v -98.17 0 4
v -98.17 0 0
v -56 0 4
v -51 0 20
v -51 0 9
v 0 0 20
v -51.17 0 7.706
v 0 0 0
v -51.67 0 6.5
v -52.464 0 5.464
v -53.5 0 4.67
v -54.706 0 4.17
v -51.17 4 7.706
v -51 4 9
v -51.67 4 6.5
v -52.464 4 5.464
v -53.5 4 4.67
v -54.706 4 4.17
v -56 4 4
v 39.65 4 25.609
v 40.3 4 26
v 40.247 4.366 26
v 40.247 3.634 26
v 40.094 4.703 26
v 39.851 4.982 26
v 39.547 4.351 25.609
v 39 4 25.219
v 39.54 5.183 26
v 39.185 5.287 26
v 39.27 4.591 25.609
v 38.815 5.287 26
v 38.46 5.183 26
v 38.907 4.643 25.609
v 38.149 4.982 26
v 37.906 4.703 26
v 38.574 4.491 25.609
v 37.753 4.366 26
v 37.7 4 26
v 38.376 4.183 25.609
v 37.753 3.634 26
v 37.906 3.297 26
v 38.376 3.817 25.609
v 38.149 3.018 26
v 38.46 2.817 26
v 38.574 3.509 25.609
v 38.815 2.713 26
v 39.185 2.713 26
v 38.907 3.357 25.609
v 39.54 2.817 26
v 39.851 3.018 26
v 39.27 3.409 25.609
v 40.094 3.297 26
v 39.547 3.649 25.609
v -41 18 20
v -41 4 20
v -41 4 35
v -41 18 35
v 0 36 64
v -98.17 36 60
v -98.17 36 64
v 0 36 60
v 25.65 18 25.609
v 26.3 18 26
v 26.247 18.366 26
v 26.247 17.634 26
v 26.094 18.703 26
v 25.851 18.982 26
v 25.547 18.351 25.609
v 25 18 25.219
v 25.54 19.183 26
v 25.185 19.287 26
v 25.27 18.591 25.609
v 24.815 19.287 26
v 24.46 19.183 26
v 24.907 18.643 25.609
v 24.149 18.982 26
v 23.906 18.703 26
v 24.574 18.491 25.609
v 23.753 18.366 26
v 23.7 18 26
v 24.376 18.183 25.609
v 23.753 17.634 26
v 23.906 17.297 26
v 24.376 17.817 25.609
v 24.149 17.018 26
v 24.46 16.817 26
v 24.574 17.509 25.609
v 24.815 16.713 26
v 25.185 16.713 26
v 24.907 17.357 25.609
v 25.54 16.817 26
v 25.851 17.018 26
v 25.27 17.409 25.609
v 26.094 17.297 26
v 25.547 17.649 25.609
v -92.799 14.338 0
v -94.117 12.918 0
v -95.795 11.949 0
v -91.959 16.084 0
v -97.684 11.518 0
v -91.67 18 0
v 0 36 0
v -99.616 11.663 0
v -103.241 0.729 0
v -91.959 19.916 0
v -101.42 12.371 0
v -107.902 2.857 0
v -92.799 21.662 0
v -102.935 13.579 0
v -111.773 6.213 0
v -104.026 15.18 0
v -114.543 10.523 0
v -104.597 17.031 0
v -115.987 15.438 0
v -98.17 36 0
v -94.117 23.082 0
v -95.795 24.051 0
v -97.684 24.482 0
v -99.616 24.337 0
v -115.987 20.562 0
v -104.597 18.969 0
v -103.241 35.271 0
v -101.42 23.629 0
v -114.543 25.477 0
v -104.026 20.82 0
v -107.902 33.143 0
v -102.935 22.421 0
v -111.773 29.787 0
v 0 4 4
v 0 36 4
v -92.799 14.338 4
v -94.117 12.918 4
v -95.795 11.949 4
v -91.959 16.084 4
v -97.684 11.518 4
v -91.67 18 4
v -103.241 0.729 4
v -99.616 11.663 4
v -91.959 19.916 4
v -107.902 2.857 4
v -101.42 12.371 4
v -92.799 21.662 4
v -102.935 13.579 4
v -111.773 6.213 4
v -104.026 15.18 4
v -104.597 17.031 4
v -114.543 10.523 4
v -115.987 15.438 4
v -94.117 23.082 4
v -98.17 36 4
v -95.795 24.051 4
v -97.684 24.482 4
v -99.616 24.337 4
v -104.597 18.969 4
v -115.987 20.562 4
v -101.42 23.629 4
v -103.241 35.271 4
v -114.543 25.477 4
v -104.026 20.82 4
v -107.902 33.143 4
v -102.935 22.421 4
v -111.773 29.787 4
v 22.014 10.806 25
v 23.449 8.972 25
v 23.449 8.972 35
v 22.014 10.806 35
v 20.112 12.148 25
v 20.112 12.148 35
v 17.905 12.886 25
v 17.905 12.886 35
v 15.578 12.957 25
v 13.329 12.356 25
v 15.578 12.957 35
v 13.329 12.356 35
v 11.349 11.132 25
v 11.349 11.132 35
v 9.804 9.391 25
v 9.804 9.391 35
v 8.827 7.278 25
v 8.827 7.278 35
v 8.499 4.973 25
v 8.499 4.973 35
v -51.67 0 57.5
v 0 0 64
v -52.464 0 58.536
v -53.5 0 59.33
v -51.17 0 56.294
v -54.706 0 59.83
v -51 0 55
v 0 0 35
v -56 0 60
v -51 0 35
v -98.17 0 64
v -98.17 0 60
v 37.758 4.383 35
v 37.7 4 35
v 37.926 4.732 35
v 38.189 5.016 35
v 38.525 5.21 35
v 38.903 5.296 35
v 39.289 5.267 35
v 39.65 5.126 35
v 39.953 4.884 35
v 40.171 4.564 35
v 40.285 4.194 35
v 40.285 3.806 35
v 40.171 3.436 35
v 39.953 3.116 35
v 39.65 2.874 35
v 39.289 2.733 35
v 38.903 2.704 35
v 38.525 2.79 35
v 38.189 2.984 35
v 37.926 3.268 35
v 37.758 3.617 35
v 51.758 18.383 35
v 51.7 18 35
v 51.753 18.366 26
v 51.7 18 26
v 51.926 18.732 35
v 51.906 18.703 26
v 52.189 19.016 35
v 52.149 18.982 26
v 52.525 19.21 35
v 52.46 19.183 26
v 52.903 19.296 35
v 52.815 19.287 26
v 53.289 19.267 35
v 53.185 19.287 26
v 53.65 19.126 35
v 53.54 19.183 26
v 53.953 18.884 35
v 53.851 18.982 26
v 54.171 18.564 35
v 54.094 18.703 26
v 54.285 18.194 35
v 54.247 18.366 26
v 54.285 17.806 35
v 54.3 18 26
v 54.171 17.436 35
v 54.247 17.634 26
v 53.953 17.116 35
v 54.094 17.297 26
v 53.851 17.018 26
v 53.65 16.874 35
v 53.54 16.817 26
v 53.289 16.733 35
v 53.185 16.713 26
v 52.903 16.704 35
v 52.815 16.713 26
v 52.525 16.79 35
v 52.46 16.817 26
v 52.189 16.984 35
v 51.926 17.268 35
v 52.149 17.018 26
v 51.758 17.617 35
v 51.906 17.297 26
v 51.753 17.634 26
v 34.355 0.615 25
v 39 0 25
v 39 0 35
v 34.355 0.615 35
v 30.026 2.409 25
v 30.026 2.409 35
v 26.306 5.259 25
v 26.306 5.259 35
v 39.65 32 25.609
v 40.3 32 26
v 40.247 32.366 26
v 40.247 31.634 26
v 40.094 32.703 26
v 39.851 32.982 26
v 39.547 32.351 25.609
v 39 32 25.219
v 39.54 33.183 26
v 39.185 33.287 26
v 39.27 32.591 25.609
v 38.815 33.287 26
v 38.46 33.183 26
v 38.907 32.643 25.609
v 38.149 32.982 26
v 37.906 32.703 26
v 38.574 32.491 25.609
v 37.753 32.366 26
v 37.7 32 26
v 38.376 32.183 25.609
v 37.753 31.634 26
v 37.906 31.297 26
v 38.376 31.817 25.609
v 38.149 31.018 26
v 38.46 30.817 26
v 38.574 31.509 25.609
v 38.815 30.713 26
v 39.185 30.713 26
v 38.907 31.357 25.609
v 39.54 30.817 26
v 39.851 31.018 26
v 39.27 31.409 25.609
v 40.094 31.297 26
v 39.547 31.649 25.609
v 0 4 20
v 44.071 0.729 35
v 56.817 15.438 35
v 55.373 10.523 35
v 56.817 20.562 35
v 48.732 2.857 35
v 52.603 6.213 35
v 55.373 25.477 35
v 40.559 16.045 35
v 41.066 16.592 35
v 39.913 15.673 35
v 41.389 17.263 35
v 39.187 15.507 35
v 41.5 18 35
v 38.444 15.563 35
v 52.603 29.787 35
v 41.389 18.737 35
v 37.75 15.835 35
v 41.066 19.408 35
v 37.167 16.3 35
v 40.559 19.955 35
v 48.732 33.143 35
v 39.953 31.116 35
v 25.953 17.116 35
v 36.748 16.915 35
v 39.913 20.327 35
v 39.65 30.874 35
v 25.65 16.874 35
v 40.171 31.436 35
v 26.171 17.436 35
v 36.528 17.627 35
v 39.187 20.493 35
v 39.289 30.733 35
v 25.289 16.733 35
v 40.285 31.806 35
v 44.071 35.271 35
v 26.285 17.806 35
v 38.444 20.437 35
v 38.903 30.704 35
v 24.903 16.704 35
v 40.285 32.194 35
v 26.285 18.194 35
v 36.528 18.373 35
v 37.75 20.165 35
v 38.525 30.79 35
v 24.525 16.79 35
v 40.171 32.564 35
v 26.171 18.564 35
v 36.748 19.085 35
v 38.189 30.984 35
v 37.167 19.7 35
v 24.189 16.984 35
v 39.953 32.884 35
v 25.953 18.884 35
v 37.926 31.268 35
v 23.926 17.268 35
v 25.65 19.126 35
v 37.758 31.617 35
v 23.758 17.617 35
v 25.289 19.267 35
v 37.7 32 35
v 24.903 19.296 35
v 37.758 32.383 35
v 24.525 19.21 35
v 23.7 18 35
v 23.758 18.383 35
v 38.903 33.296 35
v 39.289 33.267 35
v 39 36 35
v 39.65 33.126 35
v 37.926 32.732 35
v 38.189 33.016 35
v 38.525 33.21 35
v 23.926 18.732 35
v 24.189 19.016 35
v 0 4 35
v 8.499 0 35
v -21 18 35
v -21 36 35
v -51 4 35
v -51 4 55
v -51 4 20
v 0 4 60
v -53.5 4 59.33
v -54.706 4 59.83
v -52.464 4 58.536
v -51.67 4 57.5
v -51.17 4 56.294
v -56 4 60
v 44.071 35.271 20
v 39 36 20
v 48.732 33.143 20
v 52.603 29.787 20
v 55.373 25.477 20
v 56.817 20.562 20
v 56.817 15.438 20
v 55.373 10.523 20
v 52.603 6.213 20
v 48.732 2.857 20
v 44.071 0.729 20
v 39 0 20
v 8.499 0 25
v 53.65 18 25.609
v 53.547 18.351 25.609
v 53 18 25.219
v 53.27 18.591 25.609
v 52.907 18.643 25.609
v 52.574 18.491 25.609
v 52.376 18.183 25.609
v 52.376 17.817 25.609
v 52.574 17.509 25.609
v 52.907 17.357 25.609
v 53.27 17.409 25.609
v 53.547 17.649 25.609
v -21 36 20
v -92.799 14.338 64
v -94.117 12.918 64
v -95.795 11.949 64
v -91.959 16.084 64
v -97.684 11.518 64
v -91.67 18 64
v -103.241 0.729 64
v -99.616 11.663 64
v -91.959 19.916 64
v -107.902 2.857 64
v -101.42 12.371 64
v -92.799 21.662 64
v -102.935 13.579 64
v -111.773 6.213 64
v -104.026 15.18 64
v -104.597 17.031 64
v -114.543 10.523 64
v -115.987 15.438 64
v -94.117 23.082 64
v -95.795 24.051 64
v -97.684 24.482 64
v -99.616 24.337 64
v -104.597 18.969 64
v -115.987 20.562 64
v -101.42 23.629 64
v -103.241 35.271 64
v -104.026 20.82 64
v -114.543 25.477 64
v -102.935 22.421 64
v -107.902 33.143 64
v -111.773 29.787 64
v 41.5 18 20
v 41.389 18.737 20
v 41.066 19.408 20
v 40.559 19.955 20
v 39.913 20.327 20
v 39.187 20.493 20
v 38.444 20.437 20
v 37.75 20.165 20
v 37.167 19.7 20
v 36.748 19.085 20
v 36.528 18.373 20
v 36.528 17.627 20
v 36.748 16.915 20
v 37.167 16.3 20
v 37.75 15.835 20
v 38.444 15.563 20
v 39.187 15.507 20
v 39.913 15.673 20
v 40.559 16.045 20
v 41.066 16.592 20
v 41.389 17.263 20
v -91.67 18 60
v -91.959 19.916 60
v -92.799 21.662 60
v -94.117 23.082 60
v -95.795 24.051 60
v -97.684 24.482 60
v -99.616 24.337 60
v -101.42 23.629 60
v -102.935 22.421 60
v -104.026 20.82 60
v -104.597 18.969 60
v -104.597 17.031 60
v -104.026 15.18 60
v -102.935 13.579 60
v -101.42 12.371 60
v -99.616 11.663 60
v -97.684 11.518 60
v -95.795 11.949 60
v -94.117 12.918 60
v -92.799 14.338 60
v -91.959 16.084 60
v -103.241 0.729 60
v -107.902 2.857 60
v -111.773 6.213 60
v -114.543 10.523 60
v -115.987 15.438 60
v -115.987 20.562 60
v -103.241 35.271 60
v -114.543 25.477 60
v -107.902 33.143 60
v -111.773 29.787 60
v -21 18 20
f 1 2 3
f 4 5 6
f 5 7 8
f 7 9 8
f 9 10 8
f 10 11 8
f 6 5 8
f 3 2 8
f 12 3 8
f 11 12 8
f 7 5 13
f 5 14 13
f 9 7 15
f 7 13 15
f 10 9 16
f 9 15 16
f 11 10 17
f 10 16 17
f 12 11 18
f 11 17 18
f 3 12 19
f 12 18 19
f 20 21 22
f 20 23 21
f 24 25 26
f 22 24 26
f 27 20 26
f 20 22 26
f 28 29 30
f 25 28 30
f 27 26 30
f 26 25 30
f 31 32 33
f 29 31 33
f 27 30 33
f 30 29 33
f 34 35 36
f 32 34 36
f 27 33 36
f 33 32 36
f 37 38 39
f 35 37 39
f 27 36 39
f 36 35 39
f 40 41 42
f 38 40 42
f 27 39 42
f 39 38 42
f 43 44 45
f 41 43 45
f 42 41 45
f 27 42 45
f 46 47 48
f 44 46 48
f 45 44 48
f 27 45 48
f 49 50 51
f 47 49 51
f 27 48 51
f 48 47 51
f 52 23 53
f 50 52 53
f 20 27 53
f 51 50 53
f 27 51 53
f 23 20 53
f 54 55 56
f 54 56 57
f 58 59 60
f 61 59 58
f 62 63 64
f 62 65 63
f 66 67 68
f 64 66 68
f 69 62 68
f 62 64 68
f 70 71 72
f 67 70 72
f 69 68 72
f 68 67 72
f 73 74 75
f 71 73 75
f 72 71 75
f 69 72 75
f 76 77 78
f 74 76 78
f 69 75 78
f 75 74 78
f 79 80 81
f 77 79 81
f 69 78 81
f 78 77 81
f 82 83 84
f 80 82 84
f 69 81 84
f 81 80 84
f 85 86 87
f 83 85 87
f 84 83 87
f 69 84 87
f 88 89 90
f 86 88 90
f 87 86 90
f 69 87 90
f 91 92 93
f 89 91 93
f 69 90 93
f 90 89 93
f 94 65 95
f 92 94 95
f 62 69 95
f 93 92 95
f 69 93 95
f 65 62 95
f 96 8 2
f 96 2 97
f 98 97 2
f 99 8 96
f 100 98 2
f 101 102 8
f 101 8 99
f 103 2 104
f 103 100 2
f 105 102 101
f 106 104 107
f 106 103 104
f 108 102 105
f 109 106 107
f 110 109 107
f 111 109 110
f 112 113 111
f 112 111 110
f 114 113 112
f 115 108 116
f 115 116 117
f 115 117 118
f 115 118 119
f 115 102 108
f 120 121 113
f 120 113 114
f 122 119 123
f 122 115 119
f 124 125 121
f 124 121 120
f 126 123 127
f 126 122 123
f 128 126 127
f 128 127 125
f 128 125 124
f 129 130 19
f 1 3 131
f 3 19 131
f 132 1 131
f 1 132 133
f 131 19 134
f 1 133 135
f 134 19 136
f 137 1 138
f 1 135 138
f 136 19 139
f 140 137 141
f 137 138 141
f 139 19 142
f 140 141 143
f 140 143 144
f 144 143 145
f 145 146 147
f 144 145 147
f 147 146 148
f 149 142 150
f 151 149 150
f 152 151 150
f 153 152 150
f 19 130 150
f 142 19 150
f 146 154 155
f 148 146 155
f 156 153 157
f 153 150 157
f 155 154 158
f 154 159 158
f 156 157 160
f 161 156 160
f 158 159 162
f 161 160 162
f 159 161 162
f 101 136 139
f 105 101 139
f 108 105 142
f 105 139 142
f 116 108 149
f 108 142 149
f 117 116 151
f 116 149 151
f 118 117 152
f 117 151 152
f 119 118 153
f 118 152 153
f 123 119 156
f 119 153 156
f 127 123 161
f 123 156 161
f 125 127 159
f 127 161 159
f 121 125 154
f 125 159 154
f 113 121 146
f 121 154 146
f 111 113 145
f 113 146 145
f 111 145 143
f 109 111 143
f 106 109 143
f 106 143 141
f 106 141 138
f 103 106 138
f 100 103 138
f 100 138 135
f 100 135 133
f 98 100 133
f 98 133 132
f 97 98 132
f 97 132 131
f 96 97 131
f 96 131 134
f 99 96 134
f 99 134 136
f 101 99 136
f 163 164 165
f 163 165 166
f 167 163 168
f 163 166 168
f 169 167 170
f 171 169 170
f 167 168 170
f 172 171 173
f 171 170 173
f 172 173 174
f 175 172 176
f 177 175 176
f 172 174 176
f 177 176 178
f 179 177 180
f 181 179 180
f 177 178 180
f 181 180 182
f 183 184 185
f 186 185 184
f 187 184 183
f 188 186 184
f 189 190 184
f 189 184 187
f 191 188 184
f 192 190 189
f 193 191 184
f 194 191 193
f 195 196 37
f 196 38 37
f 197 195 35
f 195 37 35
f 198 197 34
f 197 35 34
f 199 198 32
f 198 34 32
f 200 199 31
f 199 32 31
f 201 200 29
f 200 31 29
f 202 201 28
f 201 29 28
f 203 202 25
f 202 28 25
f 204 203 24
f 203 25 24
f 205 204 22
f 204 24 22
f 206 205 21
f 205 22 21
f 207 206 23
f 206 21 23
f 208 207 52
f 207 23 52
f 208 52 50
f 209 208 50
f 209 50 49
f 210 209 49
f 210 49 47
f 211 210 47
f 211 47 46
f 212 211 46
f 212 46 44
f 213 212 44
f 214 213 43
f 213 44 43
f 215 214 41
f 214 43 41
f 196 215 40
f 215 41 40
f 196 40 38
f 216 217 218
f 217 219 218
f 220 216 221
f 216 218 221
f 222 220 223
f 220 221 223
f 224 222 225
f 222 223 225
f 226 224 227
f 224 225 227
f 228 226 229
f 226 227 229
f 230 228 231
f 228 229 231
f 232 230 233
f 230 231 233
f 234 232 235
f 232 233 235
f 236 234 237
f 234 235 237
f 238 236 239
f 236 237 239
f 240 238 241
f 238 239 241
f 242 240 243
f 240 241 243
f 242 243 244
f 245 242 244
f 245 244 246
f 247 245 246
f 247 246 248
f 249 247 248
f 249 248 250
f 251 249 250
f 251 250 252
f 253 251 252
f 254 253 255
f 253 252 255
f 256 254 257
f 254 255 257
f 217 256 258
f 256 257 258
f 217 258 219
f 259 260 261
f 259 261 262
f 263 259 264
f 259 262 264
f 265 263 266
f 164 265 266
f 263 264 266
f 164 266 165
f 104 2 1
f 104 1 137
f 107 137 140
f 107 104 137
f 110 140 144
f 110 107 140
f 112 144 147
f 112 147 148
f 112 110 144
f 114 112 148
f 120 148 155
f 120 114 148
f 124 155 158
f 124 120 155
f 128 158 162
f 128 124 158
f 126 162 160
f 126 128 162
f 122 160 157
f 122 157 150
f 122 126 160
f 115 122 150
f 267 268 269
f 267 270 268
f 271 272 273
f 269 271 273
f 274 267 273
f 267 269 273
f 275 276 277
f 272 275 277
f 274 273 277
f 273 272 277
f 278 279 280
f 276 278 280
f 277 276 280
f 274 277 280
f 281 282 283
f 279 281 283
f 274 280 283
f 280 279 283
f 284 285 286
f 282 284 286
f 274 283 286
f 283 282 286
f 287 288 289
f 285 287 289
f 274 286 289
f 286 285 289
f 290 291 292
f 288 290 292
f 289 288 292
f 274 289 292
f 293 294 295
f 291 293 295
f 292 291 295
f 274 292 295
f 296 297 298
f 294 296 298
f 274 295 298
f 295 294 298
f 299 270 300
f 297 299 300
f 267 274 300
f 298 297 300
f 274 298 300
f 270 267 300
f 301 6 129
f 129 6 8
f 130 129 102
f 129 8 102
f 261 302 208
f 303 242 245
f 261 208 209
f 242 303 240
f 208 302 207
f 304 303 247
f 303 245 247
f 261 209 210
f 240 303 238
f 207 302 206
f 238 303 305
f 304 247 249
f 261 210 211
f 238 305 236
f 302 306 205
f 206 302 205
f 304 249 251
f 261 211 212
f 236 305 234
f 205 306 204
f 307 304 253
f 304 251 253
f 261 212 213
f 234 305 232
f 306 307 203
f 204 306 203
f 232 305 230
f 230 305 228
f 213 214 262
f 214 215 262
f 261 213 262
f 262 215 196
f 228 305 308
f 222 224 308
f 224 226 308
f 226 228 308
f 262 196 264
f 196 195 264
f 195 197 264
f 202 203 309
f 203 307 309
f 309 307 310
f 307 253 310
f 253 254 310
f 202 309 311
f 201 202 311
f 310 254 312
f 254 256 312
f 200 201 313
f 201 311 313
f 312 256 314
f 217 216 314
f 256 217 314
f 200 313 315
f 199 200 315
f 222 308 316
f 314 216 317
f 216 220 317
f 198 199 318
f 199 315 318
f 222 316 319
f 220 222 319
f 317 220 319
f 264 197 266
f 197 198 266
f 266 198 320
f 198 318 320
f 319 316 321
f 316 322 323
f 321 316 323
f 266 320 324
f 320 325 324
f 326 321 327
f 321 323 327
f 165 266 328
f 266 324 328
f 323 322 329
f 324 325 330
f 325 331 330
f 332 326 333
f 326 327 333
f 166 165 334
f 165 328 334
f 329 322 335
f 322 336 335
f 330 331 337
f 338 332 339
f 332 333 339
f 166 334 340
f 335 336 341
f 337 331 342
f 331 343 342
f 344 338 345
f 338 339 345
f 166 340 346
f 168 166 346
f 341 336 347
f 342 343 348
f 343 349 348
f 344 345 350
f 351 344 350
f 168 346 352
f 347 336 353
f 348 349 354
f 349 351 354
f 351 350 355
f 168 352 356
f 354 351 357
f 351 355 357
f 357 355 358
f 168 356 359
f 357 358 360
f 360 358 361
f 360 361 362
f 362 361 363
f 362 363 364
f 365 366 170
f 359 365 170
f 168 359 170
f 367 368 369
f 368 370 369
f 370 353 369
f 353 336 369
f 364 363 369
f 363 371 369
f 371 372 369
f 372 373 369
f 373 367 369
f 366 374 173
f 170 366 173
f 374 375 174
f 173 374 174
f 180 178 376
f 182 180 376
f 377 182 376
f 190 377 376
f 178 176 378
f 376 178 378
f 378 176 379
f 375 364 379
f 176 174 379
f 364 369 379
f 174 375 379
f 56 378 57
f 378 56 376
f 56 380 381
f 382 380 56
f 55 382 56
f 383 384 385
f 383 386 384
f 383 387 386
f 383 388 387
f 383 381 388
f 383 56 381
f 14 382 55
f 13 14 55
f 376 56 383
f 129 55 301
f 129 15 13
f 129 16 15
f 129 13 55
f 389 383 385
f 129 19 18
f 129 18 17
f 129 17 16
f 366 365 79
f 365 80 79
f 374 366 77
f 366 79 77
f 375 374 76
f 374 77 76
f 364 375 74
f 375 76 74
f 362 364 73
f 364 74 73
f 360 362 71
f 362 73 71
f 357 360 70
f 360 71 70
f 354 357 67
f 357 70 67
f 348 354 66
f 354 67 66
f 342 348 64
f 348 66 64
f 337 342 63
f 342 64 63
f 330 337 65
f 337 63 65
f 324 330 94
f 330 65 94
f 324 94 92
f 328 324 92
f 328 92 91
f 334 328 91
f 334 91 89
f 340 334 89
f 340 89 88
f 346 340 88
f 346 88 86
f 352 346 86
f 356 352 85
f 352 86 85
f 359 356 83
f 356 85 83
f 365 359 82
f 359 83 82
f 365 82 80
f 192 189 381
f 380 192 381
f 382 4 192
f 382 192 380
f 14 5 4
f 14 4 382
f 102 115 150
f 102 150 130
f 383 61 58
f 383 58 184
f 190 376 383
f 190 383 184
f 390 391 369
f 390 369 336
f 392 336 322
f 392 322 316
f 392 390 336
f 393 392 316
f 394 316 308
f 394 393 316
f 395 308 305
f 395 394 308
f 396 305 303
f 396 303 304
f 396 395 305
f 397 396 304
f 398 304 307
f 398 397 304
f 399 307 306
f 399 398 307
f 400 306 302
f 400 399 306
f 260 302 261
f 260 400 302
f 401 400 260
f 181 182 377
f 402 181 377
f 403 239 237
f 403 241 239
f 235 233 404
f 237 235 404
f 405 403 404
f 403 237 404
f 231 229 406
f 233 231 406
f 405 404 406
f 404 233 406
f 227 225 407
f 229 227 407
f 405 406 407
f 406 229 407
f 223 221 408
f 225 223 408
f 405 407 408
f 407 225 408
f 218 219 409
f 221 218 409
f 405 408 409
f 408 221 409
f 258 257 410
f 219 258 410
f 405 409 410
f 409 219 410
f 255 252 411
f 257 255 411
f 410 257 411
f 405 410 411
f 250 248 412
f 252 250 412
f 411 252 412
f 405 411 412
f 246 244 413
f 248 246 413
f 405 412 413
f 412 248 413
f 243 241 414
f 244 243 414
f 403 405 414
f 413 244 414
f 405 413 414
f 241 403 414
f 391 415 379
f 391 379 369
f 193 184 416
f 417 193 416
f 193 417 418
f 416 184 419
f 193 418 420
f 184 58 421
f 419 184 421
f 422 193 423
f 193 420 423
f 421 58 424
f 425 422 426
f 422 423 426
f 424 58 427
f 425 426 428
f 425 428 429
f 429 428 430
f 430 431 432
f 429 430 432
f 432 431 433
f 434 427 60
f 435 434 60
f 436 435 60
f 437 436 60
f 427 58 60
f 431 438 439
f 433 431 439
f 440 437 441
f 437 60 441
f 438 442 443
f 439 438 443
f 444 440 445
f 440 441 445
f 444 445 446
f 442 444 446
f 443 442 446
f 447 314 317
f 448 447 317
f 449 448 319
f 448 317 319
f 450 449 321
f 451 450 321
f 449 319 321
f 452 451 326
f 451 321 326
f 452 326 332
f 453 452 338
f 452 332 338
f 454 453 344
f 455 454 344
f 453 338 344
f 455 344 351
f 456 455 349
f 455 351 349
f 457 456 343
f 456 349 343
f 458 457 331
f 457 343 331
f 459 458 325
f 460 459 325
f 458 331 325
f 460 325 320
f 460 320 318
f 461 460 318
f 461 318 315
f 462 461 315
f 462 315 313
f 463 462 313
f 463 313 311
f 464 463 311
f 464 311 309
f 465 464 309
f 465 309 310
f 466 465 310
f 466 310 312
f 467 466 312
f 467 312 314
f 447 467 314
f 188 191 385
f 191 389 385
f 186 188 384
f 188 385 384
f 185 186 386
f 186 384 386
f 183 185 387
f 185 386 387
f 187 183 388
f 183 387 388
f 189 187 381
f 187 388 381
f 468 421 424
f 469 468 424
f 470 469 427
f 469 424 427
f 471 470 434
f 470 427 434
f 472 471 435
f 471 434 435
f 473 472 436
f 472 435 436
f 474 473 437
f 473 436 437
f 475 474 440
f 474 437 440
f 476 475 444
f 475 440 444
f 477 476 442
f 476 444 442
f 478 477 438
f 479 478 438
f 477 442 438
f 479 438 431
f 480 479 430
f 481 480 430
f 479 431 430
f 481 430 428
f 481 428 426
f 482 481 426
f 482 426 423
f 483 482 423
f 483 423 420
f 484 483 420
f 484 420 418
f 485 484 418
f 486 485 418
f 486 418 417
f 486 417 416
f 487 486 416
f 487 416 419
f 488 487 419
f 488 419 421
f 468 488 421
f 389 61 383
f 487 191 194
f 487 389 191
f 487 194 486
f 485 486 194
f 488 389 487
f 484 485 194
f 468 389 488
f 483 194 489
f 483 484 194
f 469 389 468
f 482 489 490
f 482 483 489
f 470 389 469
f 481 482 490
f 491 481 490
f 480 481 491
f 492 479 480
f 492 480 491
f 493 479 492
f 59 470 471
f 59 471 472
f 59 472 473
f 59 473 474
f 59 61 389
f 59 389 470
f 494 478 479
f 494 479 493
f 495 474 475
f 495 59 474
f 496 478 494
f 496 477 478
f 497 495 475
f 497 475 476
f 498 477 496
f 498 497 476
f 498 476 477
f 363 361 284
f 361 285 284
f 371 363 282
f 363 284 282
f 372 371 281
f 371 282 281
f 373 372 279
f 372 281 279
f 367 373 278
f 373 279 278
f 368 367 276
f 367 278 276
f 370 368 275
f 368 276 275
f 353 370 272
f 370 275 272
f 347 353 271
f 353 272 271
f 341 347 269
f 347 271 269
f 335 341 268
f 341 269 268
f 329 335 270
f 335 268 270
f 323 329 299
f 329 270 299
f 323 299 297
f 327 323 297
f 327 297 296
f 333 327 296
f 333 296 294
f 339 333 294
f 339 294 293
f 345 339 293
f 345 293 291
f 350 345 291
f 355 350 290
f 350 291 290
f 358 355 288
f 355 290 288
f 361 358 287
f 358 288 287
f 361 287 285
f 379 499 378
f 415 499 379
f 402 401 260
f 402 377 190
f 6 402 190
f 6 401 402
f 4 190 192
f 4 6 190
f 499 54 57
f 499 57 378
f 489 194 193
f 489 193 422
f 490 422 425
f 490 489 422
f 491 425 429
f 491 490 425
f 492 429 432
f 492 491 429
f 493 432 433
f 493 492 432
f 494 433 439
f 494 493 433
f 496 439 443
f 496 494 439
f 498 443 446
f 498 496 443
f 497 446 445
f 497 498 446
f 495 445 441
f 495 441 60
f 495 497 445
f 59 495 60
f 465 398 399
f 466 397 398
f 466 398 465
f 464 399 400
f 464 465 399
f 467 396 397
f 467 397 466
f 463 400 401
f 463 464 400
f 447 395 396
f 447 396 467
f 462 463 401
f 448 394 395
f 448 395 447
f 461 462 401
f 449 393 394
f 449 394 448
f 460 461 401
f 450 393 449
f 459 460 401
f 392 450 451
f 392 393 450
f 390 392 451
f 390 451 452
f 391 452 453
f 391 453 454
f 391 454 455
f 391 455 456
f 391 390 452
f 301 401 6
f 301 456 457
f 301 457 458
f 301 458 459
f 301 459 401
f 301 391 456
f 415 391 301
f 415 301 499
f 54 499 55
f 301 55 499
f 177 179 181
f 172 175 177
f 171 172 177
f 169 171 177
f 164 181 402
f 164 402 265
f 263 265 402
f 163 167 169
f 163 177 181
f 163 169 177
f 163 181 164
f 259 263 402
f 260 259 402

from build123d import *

# Parameters (mm, degrees)
BOSS_EXTRUDE1_DEPTH       = 4
SKETCH2_W                 = 51
SKETCH2_H                 = 4
BOSS_EXTRUDE2_DEPTH       = 16
BOSS_EXTRUDE3_DEPTH       = 15
SKETCH4_W                 = 51
SKETCH4_H                 = 4
BOSS_EXTRUDE4_DEPTH       = 25
BOSS_EXTRUDE5_DEPTH       = 4
SKETCH6_R                 = 6.5
CUT_EXTRUDE1_DEPTH        = 138.431688125
SKETCH7_R                 = 2.5
CUT_EXTRUDE2_DEPTH        = 127.55618871
CUT_EXTRUDE7_DEPTH        = 10
M3X0_5_TAPPED_HOLE1_D     = 2.6
M3X0_5_TAPPED_HOLE1_DEPTH = 9
M3X0_5_TAPPED_HOLE1_TIP   = 0.781118805
FILLET1_R                 = 5


with BuildPart() as part:
    # Sketch1 → Boss-Extrude1 (new body)
    with BuildSketch(Plane.XY):
        with BuildLine():
            Line((0, 0), (-98.17, 0))
            ThreePointArc((-98.17, 0), (-116.17, 18), (-98.17, 36))
            Line((-98.17, 36), (0, 36))
            Line((0, 36), (0, 0))
        make_face()
    extrude(amount=BOSS_EXTRUDE1_DEPTH)

    # Sketch2 → Boss-Extrude2 (add)
    with BuildSketch(Plane.XY.offset(4)):
        with Locations((-25.5, 2)):
            Rectangle(SKETCH2_W, SKETCH2_H)
    extrude(amount=BOSS_EXTRUDE2_DEPTH)

    # Sketch3 → Boss-Extrude3 (add)
    with BuildSketch(Plane.XY.offset(20)):
        with BuildLine():
            Line((-51, 1.1e-08), (-51, 4.000000011))
            Line((-51, 4.000000011), (-41, 4.000000011))
            Line((-41, 4.000000011), (-41, 18.000000011))
            Line((-41, 18.000000011), (-21, 18.000000011))
            Line((-21, 18.000000011), (-21, 36.000000011))
            Line((-21, 36.000000011), (39.000002857, 35.999993821))
            ThreePointArc((39.000002857, 35.999993821), (56.999993821, 17.999998572), (39, 6.179e-06))
            Line((39, 6.179e-06), (-51, 1.1e-08))
        make_face()
    extrude(amount=BOSS_EXTRUDE3_DEPTH)

    # Sketch4 → Boss-Extrude4 (add)
    with BuildSketch(Plane.XY.offset(35)):
        with Locations((-25.5, 2)):
            Rectangle(SKETCH4_W, SKETCH4_H)
    extrude(amount=BOSS_EXTRUDE4_DEPTH)

    # Sketch5 → Boss-Extrude5 (add)
    with BuildSketch(Plane.XY.offset(60)):
        with BuildLine():
            Line((0, 0), (-98.17, 0))
            ThreePointArc((-98.17, 0), (-116.17, 18), (-98.17, 36))
            Line((-98.17, 36), (0, 36))
            Line((0, 36), (0, 0))
        make_face()
    extrude(amount=BOSS_EXTRUDE5_DEPTH)

    # Sketch6 → Cut-Extrude1 (cut, through all)
    with BuildSketch(Plane.XY.offset(64)):
        with Locations((-98.17, 18)):
            Circle(SKETCH6_R)
    extrude(amount=-CUT_EXTRUDE1_DEPTH, mode=Mode.SUBTRACT)

    # Sketch7 → Cut-Extrude2 (cut, through all)
    with BuildSketch(Plane.XY.offset(35)):
        with Locations((39, 18)):
            Circle(SKETCH7_R)
    extrude(amount=-CUT_EXTRUDE2_DEPTH, mode=Mode.SUBTRACT)

    # Sketch8 → Cut-Extrude7 (cut)
    with BuildSketch(Plane.XY.offset(35)):
        with BuildLine():
            Line((8.498741262, 4.973372122), (8.498741262, 0))
            Line((8.498741262, 0), (39, 6.179e-06))
            ThreePointArc((39, 6.179e-06), (30.025855334, 2.408885262), (23.448763614, 8.972408358))
            ThreePointArc((23.448763614, 8.972408358), (14.431387141, 12.738878418), (8.498741262, 4.973372122))
        make_face()
    extrude(amount=-CUT_EXTRUDE7_DEPTH, mode=Mode.SUBTRACT)

    # M3x0.5 Tapped Hole1
    with Locations(Plane.XY.offset(35)):
        with Locations((39, 32), (25, 18), (39, 4), (53, 18)):
            Hole(M3X0_5_TAPPED_HOLE1_D / 2, depth=M3X0_5_TAPPED_HOLE1_DEPTH)
            with Locations((0, 0, -(M3X0_5_TAPPED_HOLE1_DEPTH + M3X0_5_TAPPED_HOLE1_TIP / 2))):  # 118° drill point
                Cone(0, M3X0_5_TAPPED_HOLE1_D / 2, M3X0_5_TAPPED_HOLE1_TIP, mode=Mode.SUBTRACT)

    # Fillet1
    fillet1_edges = [part.edges().sort_by_distance(p)[0] for p in [
        (-51, 2, 4),
        (-51, 2, 60),
    ]]
    fillet(fillet1_edges, radius=FILLET1_R)


solid = part.part
